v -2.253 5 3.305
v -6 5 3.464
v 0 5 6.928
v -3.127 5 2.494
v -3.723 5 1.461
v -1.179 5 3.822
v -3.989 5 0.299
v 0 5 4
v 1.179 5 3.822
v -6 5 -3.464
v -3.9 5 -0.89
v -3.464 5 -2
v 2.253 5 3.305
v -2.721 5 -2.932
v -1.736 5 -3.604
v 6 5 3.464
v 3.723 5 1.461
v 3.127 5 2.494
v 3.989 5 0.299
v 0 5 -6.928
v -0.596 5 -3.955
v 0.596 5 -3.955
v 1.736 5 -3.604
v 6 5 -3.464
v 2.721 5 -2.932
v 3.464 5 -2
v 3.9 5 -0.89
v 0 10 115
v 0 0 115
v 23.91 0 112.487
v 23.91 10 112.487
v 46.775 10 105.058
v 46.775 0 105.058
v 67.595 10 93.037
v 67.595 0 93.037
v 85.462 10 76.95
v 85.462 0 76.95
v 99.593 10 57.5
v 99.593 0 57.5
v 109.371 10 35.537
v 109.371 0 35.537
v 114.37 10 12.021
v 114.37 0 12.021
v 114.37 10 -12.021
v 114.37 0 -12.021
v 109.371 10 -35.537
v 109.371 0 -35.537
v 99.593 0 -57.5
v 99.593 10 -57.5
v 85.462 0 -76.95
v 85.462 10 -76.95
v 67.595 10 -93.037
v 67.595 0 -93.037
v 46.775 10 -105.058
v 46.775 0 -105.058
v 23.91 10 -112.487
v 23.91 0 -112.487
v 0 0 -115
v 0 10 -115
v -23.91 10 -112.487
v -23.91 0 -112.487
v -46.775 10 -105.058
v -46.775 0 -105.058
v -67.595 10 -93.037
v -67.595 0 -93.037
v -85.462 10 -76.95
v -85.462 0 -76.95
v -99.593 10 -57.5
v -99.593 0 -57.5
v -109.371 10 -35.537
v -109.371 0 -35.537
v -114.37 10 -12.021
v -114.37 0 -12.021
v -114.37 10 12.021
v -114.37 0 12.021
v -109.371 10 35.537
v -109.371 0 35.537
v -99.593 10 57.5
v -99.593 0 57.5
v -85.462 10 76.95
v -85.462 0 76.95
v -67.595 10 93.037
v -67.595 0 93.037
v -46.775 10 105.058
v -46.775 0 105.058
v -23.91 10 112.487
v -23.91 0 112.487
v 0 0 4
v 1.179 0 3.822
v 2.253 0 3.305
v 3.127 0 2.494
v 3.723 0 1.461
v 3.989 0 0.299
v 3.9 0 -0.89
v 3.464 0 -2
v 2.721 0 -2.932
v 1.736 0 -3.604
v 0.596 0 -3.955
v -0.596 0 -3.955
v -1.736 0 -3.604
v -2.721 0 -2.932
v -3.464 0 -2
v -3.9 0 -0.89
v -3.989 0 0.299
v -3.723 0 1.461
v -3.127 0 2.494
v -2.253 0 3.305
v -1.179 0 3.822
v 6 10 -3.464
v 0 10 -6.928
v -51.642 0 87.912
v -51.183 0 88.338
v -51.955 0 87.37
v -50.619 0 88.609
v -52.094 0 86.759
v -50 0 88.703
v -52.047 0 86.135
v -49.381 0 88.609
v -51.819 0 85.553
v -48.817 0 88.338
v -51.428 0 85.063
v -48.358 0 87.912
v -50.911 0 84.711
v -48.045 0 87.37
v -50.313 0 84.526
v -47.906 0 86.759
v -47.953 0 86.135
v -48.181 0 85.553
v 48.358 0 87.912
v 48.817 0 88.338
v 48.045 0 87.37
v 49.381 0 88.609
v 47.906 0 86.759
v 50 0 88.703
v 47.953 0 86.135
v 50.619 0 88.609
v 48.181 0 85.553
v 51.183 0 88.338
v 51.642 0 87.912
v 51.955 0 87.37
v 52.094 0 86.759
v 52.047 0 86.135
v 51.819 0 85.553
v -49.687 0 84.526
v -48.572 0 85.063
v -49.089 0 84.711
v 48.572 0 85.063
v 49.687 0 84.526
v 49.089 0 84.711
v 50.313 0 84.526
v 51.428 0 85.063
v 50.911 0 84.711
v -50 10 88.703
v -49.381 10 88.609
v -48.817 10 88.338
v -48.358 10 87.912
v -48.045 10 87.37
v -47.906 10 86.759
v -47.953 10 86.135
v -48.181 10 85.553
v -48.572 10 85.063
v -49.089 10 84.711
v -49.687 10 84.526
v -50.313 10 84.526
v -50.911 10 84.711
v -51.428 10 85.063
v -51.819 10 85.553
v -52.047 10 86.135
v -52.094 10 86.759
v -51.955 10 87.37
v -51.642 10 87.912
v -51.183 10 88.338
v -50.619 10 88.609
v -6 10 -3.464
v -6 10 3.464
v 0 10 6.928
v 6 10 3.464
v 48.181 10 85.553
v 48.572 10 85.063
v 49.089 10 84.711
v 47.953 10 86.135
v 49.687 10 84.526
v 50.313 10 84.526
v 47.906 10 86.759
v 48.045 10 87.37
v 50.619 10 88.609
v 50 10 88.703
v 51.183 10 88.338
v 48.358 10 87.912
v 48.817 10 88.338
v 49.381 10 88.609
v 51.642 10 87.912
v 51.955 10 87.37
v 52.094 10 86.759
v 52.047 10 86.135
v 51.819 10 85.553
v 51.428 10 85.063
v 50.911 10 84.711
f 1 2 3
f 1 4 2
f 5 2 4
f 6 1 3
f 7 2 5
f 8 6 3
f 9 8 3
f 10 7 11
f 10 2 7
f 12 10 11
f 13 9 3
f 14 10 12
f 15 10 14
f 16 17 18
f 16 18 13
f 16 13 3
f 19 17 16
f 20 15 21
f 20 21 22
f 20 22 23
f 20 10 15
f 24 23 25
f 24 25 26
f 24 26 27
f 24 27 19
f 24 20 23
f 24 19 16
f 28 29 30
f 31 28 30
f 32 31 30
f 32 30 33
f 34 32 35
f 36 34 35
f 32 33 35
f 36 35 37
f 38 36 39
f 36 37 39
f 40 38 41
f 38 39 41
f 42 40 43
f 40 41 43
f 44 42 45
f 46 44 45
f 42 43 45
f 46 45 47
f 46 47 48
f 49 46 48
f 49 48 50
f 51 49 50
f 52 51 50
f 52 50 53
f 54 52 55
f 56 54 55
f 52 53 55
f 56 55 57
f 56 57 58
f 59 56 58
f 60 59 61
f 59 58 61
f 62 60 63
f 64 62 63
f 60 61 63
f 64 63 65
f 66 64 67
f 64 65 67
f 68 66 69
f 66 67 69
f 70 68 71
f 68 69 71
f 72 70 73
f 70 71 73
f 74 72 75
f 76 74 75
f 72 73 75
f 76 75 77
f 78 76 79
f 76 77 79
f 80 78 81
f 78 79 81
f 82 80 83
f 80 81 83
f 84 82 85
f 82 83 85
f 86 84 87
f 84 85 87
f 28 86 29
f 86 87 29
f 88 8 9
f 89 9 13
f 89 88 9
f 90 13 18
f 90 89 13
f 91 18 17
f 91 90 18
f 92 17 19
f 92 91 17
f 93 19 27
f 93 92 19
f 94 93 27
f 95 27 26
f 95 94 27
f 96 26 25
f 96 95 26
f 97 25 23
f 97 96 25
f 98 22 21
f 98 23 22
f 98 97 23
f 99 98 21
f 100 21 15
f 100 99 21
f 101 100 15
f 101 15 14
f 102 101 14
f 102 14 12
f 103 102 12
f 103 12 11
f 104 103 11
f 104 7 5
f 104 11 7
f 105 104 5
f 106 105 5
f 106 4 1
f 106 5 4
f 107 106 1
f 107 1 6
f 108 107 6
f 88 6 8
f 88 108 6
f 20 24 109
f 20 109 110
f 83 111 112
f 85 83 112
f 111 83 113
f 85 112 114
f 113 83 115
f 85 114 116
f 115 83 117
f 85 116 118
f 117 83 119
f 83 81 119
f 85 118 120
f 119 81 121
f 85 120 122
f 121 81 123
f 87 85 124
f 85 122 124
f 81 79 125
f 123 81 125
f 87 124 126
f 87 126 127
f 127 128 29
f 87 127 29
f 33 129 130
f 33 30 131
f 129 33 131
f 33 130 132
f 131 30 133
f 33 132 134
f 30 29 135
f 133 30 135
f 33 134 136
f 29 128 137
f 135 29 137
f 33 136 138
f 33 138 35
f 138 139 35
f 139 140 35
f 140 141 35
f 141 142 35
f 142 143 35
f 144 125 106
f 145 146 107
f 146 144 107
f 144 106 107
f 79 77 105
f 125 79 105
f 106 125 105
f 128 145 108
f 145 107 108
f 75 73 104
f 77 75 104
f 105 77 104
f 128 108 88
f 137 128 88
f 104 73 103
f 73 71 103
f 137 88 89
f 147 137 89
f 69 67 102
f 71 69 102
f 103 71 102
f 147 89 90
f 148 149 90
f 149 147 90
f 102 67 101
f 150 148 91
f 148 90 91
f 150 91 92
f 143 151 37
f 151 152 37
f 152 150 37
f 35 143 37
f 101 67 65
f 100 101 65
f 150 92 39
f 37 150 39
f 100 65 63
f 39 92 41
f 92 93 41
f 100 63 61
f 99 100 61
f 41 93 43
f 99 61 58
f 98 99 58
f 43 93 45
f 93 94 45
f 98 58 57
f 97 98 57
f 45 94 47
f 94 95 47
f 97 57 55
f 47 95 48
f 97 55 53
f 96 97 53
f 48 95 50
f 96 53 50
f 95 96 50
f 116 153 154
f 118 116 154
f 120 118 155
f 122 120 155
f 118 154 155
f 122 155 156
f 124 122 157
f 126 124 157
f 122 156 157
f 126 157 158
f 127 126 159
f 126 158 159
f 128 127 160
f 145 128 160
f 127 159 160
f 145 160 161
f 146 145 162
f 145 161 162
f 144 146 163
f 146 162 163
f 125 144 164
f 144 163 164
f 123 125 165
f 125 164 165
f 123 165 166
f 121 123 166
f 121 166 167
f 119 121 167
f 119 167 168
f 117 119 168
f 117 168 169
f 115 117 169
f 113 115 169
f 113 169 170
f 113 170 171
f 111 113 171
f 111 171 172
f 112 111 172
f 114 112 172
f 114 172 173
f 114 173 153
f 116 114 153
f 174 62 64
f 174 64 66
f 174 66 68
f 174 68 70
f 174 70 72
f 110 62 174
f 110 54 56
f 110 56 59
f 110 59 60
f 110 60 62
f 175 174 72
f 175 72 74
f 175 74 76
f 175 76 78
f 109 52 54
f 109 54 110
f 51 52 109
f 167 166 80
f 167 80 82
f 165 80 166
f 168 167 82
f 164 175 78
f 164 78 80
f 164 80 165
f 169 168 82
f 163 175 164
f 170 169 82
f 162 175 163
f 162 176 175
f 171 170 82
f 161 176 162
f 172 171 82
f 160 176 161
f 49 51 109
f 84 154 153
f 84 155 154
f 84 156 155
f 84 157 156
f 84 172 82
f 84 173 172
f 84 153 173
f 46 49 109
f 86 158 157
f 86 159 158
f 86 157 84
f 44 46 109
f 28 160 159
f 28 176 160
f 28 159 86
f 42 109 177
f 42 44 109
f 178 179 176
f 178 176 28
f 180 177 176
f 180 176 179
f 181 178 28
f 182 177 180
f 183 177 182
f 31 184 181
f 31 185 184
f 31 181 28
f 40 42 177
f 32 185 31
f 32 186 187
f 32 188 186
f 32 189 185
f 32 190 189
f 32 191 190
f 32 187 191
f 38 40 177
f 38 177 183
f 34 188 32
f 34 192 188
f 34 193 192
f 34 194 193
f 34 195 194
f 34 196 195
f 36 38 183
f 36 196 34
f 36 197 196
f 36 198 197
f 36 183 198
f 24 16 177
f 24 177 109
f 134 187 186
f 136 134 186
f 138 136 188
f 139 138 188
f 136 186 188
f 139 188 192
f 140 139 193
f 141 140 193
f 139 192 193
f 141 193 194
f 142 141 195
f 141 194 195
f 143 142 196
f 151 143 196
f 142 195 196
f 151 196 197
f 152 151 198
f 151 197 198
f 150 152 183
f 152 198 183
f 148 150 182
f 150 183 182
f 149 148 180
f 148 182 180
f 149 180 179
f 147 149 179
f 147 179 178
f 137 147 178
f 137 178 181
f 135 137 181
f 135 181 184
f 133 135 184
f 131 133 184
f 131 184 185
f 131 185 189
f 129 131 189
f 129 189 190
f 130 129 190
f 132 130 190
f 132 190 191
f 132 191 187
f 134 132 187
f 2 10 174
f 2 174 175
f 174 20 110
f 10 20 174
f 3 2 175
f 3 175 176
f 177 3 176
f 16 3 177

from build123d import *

# Parameters (mm, degrees)
SKETCH_2_R          = 115
EXTRUDE_2_DEPTH     = 10
EXTRUDE_3_DEPTH     = 5
CUT_EXTRUDE_2_REACH = 164.942
CUT_EXTRUDE_3_REACH = 164.942
SKETCH_4_R          = 2.1


with BuildPart() as part:
    # 草图2 → 凸台-拉伸2 (new body)
    with BuildSketch(Plane(origin=(0, 0, 0), x_dir=(1, 0, 0), z_dir=(0, 1, 0))):
        Circle(SKETCH_2_R)
        Polygon((6, 3.464101615), (6, -3.464101615), (0, -6.92820323), (-6, -3.464101615), (-6, 3.464101615), (0, 6.92820323), align=None, mode=Mode.SUBTRACT)
    extrude(amount=EXTRUDE_2_DEPTH)

    # 草图2<4> → 凸台-拉伸3 (add)
    with BuildSketch(Plane(origin=(0, 0, 0), x_dir=(1, 0, 0), z_dir=(0, 1, 0))):
        Polygon((0, -6.92820323), (6, -3.464101615), (6, 3.464101615), (0, 6.92820323), (-6, 3.464101615), (-6, -3.464101615), align=None)
    extrude(amount=EXTRUDE_3_DEPTH)

    # 草图2<6> → 切除-拉伸2 (cut, up to next)
    with BuildSketch(Plane(origin=(0, 0, 0), x_dir=(1, 0, 0), z_dir=(0, 1, 0)), mode=Mode.PRIVATE) as cut_extrude_2_sk1:
        with BuildLine():
            ThreePointArc((1.999999959, -3.464101639), (3.464101603, -2.000000021), (4, 0))
            ThreePointArc((4, 0), (3.464101628, 1.999999978), (2.000000044, 3.464101589))
            ThreePointArc((2.000000044, 3.464101589), (-1.8e-08, 4), (-2.000000076, 3.464101571))
            ThreePointArc((-2.000000076, 3.464101571), (-3.464101637, 1.999999962), (-4, 0))
            ThreePointArc((-4, 0), (-3.464101617, -1.999999997), (-2.000000006, -3.464101612))
            ThreePointArc((-2.000000006, -3.464101612), (-2.7e-08, -4), (1.999999959, -3.464101639))
        make_face()
    cut_extrude_2_tool1 = extrude(cut_extrude_2_sk1.sketch, amount=CUT_EXTRUDE_2_REACH, mode=Mode.PRIVATE) & part.part
    add(cut_extrude_2_tool1.solids().sort_by_distance((0, 0, 0))[0], mode=Mode.SUBTRACT)

    # 草图4 → 切除-拉伸3 (cut, up to next)
    with BuildSketch(Plane(origin=(0, 10, 0), x_dir=(1, 0, 0), z_dir=(0, 1, 0)), mode=Mode.PRIVATE) as cut_extrude_3_sk1:
        with Locations((-50, -86.602540378)):
            Circle(SKETCH_4_R)
    cut_extrude_3_tool1 = extrude(cut_extrude_3_sk1.sketch, amount=-CUT_EXTRUDE_3_REACH, mode=Mode.PRIVATE) & part.part
    # 草图4 → 切除-拉伸3 (cut, up to next)
    with BuildSketch(Plane(origin=(0, 10, 0), x_dir=(1, 0, 0), z_dir=(0, 1, 0)), mode=Mode.PRIVATE) as cut_extrude_3_sk2:
        with Locations((50, -86.602540378)):
            Circle(SKETCH_4_R)
    cut_extrude_3_tool2 = extrude(cut_extrude_3_sk2.sketch, amount=-CUT_EXTRUDE_3_REACH, mode=Mode.PRIVATE) & part.part
    add(cut_extrude_3_tool1.solids().sort_by_distance((-50, 10, 86.60254))[0], mode=Mode.SUBTRACT)
    add(cut_extrude_3_tool2.solids().sort_by_distance((50, 10, 86.60254))[0], mode=Mode.SUBTRACT)


solid = part.part
